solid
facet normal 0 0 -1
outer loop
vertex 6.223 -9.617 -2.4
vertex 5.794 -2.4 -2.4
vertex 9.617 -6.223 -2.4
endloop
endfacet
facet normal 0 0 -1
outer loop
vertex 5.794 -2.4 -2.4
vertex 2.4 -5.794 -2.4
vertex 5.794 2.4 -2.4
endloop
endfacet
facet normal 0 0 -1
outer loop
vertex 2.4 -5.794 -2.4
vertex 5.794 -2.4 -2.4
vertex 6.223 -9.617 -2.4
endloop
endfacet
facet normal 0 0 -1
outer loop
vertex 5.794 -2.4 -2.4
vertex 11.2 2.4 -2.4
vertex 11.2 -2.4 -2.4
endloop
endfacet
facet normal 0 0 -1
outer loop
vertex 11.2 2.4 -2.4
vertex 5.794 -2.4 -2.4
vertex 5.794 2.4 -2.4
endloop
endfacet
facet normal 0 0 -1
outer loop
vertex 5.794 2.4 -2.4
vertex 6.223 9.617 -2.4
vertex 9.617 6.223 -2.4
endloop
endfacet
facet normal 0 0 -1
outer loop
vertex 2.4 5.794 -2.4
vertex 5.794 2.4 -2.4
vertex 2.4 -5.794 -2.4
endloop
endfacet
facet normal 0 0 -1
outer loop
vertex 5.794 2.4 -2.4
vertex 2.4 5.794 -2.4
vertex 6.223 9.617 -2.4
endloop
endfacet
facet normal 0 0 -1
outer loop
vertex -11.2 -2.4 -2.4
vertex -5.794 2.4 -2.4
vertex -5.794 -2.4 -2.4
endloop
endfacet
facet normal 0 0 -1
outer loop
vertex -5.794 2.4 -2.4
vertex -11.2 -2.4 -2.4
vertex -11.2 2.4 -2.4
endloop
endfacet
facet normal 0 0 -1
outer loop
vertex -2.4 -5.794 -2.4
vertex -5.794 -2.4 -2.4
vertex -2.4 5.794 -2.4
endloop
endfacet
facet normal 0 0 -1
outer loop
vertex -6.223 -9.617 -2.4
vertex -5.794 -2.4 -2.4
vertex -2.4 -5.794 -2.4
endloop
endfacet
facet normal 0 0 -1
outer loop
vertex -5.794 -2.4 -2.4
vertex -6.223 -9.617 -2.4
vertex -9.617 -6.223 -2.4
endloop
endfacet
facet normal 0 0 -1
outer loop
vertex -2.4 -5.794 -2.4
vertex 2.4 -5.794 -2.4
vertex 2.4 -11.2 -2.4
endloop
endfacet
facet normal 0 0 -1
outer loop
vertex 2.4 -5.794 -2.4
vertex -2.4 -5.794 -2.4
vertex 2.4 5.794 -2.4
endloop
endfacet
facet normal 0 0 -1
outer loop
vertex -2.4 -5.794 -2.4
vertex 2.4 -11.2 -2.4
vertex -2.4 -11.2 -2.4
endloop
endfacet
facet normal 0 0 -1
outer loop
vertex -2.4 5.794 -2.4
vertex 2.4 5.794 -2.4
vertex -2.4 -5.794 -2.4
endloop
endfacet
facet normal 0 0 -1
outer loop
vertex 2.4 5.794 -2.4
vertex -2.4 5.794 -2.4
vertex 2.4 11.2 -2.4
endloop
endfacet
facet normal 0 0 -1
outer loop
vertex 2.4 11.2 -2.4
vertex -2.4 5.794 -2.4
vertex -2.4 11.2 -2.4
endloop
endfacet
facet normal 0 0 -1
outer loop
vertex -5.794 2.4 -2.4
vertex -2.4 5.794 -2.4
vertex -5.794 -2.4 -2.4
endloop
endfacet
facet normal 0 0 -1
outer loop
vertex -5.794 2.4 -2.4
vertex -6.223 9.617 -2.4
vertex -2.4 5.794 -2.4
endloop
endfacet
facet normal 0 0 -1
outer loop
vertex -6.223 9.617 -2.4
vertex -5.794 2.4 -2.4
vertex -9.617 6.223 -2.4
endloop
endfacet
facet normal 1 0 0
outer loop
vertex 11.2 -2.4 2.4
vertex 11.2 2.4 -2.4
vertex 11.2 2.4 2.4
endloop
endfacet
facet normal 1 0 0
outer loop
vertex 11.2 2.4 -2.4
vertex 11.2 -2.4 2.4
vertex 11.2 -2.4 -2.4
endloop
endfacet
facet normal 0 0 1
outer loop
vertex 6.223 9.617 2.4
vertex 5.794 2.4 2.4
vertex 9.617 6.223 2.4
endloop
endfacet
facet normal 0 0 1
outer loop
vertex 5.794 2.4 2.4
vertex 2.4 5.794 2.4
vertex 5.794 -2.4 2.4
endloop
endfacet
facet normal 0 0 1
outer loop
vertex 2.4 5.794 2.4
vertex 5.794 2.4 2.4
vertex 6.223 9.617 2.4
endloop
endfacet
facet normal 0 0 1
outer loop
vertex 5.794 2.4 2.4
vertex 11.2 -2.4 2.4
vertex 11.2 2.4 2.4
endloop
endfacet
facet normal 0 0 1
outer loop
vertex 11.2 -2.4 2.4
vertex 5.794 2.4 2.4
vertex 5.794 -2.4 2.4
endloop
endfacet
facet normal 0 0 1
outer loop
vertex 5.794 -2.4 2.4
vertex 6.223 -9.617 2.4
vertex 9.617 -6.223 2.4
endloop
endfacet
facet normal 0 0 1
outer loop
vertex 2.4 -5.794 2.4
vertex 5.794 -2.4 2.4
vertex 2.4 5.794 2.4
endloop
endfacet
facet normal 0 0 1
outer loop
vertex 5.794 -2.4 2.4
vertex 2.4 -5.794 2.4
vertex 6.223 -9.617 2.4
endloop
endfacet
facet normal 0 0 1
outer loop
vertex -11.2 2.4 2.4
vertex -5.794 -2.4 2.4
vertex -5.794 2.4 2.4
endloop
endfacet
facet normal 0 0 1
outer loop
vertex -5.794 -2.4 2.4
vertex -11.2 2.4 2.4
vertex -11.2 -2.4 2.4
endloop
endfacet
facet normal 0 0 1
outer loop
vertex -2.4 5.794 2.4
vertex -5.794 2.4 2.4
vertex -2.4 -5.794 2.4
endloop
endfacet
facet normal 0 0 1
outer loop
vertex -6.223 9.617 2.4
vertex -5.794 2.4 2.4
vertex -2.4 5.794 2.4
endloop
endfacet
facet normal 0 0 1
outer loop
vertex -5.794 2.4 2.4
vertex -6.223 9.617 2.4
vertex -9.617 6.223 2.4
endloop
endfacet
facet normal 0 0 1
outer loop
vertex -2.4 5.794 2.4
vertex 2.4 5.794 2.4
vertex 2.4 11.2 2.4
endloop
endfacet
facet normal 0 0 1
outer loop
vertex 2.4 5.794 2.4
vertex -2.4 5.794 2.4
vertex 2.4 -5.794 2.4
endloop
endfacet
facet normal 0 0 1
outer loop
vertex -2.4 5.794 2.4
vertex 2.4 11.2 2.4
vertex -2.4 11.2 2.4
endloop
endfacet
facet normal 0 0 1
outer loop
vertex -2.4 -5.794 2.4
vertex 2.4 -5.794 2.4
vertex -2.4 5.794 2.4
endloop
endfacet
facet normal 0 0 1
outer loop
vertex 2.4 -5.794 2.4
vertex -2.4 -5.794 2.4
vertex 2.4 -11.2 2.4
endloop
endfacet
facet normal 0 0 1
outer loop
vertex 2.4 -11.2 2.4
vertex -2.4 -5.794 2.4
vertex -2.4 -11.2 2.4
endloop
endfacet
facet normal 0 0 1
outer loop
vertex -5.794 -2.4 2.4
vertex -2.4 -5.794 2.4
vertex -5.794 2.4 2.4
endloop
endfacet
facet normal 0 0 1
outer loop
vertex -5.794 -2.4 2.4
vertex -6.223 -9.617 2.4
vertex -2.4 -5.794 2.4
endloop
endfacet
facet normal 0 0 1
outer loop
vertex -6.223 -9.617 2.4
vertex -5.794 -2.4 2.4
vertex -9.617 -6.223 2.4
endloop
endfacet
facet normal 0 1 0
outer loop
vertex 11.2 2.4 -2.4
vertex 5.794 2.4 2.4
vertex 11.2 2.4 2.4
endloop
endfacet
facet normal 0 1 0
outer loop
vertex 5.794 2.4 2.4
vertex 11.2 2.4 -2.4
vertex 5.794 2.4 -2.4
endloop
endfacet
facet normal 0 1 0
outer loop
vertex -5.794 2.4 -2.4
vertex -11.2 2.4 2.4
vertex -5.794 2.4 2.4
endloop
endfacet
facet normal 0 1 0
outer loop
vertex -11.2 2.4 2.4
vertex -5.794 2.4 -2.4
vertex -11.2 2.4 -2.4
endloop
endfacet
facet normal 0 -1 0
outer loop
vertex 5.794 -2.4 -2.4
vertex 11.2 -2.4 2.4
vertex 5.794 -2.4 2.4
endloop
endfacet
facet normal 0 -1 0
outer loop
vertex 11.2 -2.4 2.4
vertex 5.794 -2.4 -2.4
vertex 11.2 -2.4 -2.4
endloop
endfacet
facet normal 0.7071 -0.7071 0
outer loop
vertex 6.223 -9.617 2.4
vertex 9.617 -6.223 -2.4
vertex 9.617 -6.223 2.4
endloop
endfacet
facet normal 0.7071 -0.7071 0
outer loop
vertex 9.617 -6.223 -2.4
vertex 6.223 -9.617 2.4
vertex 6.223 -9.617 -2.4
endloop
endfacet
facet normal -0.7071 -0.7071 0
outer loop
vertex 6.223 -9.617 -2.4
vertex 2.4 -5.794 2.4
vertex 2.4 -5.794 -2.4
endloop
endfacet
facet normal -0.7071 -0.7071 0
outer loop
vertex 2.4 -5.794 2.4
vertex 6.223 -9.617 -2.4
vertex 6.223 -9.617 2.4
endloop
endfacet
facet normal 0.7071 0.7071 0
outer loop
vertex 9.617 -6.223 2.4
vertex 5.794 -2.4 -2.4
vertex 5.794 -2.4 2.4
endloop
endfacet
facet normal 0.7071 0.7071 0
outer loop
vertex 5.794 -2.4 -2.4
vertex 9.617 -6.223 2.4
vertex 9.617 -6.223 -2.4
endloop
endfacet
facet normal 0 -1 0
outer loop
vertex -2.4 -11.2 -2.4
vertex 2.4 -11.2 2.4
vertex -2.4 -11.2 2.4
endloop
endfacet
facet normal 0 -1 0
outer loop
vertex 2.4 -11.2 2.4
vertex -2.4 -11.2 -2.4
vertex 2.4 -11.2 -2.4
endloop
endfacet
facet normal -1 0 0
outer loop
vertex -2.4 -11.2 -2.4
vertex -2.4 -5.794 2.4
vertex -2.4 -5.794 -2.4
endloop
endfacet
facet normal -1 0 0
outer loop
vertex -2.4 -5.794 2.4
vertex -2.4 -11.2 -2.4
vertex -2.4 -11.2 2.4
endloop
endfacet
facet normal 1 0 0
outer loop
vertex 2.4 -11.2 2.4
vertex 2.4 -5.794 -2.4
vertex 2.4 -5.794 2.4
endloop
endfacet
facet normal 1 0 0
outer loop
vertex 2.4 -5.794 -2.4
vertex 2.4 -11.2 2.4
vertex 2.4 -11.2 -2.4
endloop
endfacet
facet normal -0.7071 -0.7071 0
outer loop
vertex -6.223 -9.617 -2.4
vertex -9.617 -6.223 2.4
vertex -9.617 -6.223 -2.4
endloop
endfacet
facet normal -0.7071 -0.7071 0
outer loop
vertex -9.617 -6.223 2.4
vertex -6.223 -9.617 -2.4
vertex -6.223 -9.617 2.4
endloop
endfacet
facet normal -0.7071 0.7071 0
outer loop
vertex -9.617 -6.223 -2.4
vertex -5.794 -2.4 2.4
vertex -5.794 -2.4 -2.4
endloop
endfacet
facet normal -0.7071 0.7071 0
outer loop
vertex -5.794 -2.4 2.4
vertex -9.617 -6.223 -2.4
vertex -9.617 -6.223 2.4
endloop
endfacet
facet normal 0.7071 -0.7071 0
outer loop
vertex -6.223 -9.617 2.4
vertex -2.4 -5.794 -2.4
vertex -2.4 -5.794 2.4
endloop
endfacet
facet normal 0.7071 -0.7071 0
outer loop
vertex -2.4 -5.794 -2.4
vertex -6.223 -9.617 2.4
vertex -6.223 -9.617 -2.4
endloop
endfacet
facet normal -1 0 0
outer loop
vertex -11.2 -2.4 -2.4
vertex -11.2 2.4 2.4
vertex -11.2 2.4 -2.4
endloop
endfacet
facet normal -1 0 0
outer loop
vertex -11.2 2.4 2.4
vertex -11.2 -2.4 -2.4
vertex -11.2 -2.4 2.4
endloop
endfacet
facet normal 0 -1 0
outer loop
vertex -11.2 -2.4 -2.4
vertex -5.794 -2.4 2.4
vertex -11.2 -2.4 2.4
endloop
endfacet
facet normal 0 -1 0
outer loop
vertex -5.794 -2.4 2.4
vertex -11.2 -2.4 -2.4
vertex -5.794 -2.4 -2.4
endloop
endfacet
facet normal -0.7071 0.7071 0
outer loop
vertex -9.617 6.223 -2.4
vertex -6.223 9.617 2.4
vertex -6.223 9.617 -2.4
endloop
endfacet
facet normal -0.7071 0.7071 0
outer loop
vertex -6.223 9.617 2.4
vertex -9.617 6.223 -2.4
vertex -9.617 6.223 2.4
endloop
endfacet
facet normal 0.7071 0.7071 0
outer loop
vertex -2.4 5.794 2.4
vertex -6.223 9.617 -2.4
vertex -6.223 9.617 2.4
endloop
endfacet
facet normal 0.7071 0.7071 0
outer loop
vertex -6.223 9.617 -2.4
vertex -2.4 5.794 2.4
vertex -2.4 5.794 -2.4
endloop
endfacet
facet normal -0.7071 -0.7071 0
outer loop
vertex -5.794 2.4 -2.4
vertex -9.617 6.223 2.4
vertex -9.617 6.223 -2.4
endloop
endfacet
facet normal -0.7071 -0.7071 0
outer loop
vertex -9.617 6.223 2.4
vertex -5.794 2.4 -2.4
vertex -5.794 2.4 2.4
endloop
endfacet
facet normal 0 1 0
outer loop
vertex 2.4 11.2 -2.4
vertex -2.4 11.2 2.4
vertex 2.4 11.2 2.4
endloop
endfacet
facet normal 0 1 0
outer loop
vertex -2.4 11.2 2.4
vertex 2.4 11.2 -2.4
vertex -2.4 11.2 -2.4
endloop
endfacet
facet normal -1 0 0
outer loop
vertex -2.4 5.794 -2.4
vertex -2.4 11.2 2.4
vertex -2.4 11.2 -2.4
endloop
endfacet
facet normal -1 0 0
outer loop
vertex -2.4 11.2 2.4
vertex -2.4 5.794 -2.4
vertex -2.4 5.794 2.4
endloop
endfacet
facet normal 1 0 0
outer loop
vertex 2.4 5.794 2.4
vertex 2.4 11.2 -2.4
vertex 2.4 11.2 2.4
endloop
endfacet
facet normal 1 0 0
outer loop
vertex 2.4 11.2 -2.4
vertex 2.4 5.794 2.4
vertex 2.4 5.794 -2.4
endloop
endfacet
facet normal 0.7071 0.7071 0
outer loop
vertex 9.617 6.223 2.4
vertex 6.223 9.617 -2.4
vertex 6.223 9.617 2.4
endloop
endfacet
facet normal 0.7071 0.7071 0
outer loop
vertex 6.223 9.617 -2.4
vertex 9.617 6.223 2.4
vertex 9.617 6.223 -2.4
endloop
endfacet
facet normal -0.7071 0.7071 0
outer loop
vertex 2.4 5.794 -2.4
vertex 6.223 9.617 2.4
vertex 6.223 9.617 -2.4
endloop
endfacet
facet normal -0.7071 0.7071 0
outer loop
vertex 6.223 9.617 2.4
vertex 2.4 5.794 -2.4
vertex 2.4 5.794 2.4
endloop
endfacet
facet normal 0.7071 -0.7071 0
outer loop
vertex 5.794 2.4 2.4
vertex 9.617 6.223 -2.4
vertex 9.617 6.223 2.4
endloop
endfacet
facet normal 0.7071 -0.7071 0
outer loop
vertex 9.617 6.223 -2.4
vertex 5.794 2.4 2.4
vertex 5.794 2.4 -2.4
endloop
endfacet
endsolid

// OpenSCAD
size = 32;//block=32 //item=8
sides = 8;


for(curr = [0:1:sides]) {
  rotate([0, 90, 0]) {
    rotate([360 / sides * curr, 0, 0]) {
      translate([0, 0, size * 0.1]) {
        cube([size * 0.15, size * 0.15, size * 0.5], center = true);
      }
      ;//translate
    }
    ;//rotate
  }
  ;//rotate
}
;//for
